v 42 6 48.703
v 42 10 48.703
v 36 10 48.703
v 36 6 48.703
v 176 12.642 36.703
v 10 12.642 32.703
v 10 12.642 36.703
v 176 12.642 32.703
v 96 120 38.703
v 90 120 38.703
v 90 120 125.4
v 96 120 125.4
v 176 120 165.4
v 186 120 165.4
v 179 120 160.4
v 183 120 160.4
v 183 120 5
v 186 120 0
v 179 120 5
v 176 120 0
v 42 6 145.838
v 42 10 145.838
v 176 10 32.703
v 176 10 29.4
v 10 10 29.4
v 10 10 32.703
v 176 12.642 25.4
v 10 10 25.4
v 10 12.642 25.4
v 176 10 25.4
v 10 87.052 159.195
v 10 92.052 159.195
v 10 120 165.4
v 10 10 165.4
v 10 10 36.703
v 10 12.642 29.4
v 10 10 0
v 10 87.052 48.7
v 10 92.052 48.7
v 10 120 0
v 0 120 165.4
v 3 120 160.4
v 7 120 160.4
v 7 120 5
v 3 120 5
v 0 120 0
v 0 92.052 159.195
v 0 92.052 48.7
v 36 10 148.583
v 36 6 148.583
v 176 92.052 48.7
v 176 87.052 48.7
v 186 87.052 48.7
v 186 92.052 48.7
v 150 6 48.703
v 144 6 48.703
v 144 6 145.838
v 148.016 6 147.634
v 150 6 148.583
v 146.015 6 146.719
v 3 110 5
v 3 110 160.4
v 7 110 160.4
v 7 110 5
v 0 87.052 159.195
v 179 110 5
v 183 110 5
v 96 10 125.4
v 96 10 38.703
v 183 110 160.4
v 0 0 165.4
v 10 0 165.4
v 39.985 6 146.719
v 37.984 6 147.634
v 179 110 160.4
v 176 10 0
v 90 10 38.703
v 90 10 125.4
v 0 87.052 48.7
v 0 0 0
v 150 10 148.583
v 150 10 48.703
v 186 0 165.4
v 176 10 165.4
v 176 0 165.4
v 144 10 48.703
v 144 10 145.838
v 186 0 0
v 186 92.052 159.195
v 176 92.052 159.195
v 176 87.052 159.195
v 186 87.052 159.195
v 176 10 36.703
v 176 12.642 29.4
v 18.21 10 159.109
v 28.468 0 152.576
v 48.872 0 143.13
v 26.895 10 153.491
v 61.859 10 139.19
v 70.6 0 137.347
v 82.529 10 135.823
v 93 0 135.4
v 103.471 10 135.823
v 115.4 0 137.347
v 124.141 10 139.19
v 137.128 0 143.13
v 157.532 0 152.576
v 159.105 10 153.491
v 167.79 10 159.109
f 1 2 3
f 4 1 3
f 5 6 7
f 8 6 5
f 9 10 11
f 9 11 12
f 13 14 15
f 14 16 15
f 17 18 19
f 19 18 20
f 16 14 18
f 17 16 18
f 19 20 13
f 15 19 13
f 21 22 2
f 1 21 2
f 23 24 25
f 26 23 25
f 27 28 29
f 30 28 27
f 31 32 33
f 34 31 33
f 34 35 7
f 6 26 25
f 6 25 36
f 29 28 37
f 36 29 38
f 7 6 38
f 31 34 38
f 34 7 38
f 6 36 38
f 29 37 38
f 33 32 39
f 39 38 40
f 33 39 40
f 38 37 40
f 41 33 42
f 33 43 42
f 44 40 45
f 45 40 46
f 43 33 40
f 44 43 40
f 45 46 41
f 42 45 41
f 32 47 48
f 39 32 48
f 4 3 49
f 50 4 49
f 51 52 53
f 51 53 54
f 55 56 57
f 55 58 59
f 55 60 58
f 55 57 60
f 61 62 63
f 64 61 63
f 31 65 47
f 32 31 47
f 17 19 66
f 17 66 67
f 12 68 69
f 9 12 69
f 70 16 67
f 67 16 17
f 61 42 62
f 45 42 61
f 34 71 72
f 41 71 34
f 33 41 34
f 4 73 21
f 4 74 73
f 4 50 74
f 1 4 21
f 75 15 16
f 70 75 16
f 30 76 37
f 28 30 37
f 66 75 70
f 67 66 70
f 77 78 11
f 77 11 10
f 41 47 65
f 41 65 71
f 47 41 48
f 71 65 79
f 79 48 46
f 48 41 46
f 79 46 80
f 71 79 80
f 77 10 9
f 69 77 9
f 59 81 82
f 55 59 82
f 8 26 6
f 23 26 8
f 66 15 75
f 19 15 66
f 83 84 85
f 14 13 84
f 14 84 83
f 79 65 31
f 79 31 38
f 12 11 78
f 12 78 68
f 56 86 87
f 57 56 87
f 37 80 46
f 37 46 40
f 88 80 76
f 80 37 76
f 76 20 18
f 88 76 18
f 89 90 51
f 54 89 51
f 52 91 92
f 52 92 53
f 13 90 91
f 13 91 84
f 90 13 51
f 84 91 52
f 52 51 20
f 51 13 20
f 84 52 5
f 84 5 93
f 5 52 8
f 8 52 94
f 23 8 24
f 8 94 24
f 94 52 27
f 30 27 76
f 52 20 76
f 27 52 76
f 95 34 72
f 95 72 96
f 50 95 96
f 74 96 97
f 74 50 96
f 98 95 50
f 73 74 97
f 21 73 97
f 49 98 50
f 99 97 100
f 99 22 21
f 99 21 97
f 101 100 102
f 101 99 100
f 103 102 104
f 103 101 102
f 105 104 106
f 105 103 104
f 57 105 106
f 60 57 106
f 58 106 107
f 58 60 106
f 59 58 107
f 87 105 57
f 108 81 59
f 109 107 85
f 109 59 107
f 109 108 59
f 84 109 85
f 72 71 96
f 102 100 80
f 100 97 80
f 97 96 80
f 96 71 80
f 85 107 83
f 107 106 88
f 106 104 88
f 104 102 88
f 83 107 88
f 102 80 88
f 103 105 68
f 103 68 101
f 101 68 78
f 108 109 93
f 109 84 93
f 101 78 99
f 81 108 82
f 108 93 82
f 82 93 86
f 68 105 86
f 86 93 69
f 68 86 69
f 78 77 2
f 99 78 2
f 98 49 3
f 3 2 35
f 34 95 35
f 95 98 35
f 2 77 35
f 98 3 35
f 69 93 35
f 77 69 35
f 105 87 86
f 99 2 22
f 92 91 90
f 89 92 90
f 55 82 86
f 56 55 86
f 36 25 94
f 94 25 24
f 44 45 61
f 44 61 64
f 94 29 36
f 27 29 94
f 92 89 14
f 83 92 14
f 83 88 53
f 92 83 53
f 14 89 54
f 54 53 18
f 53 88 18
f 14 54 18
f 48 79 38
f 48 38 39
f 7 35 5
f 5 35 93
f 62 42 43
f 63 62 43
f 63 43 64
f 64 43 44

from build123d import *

# Parameters (mm, degrees)
EXTRUDE_THIN2_DEPTH     = 165.4
SKETCH11_W              = 166
SKETCH11_H              = 4
BOSS_EXTRUDE3_DEPTH     = 2.6416
CUT_EXTRUDE6_DEPTH      = 270.69086006
CUT_EXTRUDE6_DEPTH_BACK = 270.69086006
SKETCH13_W              = 110.495011338
SKETCH13_H              = 5
CUT_EXTRUDE7_DEPTH      = 273.127102656
SKETCH19_W              = 4
SKETCH19_H              = 155.4
CUT_EXTRUDE9_DEPTH      = 10
SKETCH20_W              = 4
SKETCH20_H              = 155.4
CUT_EXTRUDE10_DEPTH     = 10
SKETCH21_W              = 6
SKETCH21_H              = 86.697
BOSS_EXTRUDE4_DEPTH     = 110
CUT_EXTRUDE11_DEPTH     = 4
SKETCH23_W              = 166
SKETCH23_H              = 4
BOSS_EXTRUDE5_DEPTH     = 2.6416


with BuildPart() as part:
    # Sketch2 → Extrude-Thin2 (new body)
    with BuildSketch(Plane.XY):
        Polygon((0, 120), (0, 0), (186, 0), (186, 120), (176, 120), (176, 10), (10, 10), (10, 120), align=None)
    extrude(amount=EXTRUDE_THIN2_DEPTH)

    # Sketch11 → Boss-Extrude3 (add)
    with BuildSketch(Plane(origin=(0, 10, 0), x_dir=(1, 0, 0), z_dir=(0, 1, 0))):
        with Locations((93, -34.703)):
            Rectangle(SKETCH11_W, SKETCH11_H)
    extrude(amount=BOSS_EXTRUDE3_DEPTH)

    # Sketch13 → Cut-Extrude6 (cut, two sides: drawn at the far end of the back side and taken through both)
    with BuildSketch(Plane(origin=(10, 0, 0), x_dir=(0, 0, -1), z_dir=(1, 0, 0)).offset(-CUT_EXTRUDE6_DEPTH_BACK)):
        with Locations((-103.947505669, 89.551599899)):
            Rectangle(SKETCH13_W, SKETCH13_H)
    extrude(amount=CUT_EXTRUDE6_DEPTH + CUT_EXTRUDE6_DEPTH_BACK, mode=Mode.SUBTRACT)

    # Sketch14 → Cut-Extrude7 (cut, through all)
    with BuildSketch(Plane(origin=(0, 10, 0), x_dir=(1, 0, 0), z_dir=(0, 1, 0))):
        with BuildLine():
            Line((176, -165.4), (10, -165.4))
            ThreePointArc((10, -165.4), (93, -135.4), (176, -165.4))
        make_face()
    extrude(amount=-CUT_EXTRUDE7_DEPTH, mode=Mode.SUBTRACT)

    # Sketch19 → Cut-Extrude9 (cut)
    with BuildSketch(Plane(origin=(0, 120, 0), x_dir=(1, 0, 0), z_dir=(0, 1, 0))):
        with Locations((5, -82.7)):
            Rectangle(SKETCH19_W, SKETCH19_H)
    extrude(amount=-CUT_EXTRUDE9_DEPTH, mode=Mode.SUBTRACT)

    # Sketch20 → Cut-Extrude10 (cut)
    with BuildSketch(Plane(origin=(0, 120, 0), x_dir=(1, 0, 0), z_dir=(0, 1, 0))):
        with Locations((181, -82.7)):
            Rectangle(SKETCH20_W, SKETCH20_H)
    extrude(amount=-CUT_EXTRUDE10_DEPTH, mode=Mode.SUBTRACT)

    # Sketch21 → Boss-Extrude4 (add, through all)
    with BuildSketch(Plane(origin=(0, 10, 0), x_dir=(1, 0, 0), z_dir=(0, 1, 0))):
        with Locations((93, -82.0515)):
            Rectangle(SKETCH21_W, SKETCH21_H)
    extrude(amount=BOSS_EXTRUDE4_DEPTH)

    # Sketch22 → Cut-Extrude11 (cut)
    with BuildSketch(Plane(origin=(0, 10, 0), x_dir=(1, 0, 0), z_dir=(0, 1, 0))):
        Polygon((36, -48.703), (36, -148.583194008), (42, -145.837577441), (42, -48.703), align=None)
        Polygon((144, -145.837577441), (150, -148.583194008), (150, -48.703), (144, -48.703), align=None)
    extrude(amount=-CUT_EXTRUDE11_DEPTH, mode=Mode.SUBTRACT)

    # Sketch23 → Boss-Extrude5 (add)
    with BuildSketch(Plane(origin=(0, 10, 0), x_dir=(1, 0, 0), z_dir=(0, 1, 0))):
        with Locations((93, -27.4)):
            Rectangle(SKETCH23_W, SKETCH23_H)
    extrude(amount=BOSS_EXTRUDE5_DEPTH)


solid = part.part
